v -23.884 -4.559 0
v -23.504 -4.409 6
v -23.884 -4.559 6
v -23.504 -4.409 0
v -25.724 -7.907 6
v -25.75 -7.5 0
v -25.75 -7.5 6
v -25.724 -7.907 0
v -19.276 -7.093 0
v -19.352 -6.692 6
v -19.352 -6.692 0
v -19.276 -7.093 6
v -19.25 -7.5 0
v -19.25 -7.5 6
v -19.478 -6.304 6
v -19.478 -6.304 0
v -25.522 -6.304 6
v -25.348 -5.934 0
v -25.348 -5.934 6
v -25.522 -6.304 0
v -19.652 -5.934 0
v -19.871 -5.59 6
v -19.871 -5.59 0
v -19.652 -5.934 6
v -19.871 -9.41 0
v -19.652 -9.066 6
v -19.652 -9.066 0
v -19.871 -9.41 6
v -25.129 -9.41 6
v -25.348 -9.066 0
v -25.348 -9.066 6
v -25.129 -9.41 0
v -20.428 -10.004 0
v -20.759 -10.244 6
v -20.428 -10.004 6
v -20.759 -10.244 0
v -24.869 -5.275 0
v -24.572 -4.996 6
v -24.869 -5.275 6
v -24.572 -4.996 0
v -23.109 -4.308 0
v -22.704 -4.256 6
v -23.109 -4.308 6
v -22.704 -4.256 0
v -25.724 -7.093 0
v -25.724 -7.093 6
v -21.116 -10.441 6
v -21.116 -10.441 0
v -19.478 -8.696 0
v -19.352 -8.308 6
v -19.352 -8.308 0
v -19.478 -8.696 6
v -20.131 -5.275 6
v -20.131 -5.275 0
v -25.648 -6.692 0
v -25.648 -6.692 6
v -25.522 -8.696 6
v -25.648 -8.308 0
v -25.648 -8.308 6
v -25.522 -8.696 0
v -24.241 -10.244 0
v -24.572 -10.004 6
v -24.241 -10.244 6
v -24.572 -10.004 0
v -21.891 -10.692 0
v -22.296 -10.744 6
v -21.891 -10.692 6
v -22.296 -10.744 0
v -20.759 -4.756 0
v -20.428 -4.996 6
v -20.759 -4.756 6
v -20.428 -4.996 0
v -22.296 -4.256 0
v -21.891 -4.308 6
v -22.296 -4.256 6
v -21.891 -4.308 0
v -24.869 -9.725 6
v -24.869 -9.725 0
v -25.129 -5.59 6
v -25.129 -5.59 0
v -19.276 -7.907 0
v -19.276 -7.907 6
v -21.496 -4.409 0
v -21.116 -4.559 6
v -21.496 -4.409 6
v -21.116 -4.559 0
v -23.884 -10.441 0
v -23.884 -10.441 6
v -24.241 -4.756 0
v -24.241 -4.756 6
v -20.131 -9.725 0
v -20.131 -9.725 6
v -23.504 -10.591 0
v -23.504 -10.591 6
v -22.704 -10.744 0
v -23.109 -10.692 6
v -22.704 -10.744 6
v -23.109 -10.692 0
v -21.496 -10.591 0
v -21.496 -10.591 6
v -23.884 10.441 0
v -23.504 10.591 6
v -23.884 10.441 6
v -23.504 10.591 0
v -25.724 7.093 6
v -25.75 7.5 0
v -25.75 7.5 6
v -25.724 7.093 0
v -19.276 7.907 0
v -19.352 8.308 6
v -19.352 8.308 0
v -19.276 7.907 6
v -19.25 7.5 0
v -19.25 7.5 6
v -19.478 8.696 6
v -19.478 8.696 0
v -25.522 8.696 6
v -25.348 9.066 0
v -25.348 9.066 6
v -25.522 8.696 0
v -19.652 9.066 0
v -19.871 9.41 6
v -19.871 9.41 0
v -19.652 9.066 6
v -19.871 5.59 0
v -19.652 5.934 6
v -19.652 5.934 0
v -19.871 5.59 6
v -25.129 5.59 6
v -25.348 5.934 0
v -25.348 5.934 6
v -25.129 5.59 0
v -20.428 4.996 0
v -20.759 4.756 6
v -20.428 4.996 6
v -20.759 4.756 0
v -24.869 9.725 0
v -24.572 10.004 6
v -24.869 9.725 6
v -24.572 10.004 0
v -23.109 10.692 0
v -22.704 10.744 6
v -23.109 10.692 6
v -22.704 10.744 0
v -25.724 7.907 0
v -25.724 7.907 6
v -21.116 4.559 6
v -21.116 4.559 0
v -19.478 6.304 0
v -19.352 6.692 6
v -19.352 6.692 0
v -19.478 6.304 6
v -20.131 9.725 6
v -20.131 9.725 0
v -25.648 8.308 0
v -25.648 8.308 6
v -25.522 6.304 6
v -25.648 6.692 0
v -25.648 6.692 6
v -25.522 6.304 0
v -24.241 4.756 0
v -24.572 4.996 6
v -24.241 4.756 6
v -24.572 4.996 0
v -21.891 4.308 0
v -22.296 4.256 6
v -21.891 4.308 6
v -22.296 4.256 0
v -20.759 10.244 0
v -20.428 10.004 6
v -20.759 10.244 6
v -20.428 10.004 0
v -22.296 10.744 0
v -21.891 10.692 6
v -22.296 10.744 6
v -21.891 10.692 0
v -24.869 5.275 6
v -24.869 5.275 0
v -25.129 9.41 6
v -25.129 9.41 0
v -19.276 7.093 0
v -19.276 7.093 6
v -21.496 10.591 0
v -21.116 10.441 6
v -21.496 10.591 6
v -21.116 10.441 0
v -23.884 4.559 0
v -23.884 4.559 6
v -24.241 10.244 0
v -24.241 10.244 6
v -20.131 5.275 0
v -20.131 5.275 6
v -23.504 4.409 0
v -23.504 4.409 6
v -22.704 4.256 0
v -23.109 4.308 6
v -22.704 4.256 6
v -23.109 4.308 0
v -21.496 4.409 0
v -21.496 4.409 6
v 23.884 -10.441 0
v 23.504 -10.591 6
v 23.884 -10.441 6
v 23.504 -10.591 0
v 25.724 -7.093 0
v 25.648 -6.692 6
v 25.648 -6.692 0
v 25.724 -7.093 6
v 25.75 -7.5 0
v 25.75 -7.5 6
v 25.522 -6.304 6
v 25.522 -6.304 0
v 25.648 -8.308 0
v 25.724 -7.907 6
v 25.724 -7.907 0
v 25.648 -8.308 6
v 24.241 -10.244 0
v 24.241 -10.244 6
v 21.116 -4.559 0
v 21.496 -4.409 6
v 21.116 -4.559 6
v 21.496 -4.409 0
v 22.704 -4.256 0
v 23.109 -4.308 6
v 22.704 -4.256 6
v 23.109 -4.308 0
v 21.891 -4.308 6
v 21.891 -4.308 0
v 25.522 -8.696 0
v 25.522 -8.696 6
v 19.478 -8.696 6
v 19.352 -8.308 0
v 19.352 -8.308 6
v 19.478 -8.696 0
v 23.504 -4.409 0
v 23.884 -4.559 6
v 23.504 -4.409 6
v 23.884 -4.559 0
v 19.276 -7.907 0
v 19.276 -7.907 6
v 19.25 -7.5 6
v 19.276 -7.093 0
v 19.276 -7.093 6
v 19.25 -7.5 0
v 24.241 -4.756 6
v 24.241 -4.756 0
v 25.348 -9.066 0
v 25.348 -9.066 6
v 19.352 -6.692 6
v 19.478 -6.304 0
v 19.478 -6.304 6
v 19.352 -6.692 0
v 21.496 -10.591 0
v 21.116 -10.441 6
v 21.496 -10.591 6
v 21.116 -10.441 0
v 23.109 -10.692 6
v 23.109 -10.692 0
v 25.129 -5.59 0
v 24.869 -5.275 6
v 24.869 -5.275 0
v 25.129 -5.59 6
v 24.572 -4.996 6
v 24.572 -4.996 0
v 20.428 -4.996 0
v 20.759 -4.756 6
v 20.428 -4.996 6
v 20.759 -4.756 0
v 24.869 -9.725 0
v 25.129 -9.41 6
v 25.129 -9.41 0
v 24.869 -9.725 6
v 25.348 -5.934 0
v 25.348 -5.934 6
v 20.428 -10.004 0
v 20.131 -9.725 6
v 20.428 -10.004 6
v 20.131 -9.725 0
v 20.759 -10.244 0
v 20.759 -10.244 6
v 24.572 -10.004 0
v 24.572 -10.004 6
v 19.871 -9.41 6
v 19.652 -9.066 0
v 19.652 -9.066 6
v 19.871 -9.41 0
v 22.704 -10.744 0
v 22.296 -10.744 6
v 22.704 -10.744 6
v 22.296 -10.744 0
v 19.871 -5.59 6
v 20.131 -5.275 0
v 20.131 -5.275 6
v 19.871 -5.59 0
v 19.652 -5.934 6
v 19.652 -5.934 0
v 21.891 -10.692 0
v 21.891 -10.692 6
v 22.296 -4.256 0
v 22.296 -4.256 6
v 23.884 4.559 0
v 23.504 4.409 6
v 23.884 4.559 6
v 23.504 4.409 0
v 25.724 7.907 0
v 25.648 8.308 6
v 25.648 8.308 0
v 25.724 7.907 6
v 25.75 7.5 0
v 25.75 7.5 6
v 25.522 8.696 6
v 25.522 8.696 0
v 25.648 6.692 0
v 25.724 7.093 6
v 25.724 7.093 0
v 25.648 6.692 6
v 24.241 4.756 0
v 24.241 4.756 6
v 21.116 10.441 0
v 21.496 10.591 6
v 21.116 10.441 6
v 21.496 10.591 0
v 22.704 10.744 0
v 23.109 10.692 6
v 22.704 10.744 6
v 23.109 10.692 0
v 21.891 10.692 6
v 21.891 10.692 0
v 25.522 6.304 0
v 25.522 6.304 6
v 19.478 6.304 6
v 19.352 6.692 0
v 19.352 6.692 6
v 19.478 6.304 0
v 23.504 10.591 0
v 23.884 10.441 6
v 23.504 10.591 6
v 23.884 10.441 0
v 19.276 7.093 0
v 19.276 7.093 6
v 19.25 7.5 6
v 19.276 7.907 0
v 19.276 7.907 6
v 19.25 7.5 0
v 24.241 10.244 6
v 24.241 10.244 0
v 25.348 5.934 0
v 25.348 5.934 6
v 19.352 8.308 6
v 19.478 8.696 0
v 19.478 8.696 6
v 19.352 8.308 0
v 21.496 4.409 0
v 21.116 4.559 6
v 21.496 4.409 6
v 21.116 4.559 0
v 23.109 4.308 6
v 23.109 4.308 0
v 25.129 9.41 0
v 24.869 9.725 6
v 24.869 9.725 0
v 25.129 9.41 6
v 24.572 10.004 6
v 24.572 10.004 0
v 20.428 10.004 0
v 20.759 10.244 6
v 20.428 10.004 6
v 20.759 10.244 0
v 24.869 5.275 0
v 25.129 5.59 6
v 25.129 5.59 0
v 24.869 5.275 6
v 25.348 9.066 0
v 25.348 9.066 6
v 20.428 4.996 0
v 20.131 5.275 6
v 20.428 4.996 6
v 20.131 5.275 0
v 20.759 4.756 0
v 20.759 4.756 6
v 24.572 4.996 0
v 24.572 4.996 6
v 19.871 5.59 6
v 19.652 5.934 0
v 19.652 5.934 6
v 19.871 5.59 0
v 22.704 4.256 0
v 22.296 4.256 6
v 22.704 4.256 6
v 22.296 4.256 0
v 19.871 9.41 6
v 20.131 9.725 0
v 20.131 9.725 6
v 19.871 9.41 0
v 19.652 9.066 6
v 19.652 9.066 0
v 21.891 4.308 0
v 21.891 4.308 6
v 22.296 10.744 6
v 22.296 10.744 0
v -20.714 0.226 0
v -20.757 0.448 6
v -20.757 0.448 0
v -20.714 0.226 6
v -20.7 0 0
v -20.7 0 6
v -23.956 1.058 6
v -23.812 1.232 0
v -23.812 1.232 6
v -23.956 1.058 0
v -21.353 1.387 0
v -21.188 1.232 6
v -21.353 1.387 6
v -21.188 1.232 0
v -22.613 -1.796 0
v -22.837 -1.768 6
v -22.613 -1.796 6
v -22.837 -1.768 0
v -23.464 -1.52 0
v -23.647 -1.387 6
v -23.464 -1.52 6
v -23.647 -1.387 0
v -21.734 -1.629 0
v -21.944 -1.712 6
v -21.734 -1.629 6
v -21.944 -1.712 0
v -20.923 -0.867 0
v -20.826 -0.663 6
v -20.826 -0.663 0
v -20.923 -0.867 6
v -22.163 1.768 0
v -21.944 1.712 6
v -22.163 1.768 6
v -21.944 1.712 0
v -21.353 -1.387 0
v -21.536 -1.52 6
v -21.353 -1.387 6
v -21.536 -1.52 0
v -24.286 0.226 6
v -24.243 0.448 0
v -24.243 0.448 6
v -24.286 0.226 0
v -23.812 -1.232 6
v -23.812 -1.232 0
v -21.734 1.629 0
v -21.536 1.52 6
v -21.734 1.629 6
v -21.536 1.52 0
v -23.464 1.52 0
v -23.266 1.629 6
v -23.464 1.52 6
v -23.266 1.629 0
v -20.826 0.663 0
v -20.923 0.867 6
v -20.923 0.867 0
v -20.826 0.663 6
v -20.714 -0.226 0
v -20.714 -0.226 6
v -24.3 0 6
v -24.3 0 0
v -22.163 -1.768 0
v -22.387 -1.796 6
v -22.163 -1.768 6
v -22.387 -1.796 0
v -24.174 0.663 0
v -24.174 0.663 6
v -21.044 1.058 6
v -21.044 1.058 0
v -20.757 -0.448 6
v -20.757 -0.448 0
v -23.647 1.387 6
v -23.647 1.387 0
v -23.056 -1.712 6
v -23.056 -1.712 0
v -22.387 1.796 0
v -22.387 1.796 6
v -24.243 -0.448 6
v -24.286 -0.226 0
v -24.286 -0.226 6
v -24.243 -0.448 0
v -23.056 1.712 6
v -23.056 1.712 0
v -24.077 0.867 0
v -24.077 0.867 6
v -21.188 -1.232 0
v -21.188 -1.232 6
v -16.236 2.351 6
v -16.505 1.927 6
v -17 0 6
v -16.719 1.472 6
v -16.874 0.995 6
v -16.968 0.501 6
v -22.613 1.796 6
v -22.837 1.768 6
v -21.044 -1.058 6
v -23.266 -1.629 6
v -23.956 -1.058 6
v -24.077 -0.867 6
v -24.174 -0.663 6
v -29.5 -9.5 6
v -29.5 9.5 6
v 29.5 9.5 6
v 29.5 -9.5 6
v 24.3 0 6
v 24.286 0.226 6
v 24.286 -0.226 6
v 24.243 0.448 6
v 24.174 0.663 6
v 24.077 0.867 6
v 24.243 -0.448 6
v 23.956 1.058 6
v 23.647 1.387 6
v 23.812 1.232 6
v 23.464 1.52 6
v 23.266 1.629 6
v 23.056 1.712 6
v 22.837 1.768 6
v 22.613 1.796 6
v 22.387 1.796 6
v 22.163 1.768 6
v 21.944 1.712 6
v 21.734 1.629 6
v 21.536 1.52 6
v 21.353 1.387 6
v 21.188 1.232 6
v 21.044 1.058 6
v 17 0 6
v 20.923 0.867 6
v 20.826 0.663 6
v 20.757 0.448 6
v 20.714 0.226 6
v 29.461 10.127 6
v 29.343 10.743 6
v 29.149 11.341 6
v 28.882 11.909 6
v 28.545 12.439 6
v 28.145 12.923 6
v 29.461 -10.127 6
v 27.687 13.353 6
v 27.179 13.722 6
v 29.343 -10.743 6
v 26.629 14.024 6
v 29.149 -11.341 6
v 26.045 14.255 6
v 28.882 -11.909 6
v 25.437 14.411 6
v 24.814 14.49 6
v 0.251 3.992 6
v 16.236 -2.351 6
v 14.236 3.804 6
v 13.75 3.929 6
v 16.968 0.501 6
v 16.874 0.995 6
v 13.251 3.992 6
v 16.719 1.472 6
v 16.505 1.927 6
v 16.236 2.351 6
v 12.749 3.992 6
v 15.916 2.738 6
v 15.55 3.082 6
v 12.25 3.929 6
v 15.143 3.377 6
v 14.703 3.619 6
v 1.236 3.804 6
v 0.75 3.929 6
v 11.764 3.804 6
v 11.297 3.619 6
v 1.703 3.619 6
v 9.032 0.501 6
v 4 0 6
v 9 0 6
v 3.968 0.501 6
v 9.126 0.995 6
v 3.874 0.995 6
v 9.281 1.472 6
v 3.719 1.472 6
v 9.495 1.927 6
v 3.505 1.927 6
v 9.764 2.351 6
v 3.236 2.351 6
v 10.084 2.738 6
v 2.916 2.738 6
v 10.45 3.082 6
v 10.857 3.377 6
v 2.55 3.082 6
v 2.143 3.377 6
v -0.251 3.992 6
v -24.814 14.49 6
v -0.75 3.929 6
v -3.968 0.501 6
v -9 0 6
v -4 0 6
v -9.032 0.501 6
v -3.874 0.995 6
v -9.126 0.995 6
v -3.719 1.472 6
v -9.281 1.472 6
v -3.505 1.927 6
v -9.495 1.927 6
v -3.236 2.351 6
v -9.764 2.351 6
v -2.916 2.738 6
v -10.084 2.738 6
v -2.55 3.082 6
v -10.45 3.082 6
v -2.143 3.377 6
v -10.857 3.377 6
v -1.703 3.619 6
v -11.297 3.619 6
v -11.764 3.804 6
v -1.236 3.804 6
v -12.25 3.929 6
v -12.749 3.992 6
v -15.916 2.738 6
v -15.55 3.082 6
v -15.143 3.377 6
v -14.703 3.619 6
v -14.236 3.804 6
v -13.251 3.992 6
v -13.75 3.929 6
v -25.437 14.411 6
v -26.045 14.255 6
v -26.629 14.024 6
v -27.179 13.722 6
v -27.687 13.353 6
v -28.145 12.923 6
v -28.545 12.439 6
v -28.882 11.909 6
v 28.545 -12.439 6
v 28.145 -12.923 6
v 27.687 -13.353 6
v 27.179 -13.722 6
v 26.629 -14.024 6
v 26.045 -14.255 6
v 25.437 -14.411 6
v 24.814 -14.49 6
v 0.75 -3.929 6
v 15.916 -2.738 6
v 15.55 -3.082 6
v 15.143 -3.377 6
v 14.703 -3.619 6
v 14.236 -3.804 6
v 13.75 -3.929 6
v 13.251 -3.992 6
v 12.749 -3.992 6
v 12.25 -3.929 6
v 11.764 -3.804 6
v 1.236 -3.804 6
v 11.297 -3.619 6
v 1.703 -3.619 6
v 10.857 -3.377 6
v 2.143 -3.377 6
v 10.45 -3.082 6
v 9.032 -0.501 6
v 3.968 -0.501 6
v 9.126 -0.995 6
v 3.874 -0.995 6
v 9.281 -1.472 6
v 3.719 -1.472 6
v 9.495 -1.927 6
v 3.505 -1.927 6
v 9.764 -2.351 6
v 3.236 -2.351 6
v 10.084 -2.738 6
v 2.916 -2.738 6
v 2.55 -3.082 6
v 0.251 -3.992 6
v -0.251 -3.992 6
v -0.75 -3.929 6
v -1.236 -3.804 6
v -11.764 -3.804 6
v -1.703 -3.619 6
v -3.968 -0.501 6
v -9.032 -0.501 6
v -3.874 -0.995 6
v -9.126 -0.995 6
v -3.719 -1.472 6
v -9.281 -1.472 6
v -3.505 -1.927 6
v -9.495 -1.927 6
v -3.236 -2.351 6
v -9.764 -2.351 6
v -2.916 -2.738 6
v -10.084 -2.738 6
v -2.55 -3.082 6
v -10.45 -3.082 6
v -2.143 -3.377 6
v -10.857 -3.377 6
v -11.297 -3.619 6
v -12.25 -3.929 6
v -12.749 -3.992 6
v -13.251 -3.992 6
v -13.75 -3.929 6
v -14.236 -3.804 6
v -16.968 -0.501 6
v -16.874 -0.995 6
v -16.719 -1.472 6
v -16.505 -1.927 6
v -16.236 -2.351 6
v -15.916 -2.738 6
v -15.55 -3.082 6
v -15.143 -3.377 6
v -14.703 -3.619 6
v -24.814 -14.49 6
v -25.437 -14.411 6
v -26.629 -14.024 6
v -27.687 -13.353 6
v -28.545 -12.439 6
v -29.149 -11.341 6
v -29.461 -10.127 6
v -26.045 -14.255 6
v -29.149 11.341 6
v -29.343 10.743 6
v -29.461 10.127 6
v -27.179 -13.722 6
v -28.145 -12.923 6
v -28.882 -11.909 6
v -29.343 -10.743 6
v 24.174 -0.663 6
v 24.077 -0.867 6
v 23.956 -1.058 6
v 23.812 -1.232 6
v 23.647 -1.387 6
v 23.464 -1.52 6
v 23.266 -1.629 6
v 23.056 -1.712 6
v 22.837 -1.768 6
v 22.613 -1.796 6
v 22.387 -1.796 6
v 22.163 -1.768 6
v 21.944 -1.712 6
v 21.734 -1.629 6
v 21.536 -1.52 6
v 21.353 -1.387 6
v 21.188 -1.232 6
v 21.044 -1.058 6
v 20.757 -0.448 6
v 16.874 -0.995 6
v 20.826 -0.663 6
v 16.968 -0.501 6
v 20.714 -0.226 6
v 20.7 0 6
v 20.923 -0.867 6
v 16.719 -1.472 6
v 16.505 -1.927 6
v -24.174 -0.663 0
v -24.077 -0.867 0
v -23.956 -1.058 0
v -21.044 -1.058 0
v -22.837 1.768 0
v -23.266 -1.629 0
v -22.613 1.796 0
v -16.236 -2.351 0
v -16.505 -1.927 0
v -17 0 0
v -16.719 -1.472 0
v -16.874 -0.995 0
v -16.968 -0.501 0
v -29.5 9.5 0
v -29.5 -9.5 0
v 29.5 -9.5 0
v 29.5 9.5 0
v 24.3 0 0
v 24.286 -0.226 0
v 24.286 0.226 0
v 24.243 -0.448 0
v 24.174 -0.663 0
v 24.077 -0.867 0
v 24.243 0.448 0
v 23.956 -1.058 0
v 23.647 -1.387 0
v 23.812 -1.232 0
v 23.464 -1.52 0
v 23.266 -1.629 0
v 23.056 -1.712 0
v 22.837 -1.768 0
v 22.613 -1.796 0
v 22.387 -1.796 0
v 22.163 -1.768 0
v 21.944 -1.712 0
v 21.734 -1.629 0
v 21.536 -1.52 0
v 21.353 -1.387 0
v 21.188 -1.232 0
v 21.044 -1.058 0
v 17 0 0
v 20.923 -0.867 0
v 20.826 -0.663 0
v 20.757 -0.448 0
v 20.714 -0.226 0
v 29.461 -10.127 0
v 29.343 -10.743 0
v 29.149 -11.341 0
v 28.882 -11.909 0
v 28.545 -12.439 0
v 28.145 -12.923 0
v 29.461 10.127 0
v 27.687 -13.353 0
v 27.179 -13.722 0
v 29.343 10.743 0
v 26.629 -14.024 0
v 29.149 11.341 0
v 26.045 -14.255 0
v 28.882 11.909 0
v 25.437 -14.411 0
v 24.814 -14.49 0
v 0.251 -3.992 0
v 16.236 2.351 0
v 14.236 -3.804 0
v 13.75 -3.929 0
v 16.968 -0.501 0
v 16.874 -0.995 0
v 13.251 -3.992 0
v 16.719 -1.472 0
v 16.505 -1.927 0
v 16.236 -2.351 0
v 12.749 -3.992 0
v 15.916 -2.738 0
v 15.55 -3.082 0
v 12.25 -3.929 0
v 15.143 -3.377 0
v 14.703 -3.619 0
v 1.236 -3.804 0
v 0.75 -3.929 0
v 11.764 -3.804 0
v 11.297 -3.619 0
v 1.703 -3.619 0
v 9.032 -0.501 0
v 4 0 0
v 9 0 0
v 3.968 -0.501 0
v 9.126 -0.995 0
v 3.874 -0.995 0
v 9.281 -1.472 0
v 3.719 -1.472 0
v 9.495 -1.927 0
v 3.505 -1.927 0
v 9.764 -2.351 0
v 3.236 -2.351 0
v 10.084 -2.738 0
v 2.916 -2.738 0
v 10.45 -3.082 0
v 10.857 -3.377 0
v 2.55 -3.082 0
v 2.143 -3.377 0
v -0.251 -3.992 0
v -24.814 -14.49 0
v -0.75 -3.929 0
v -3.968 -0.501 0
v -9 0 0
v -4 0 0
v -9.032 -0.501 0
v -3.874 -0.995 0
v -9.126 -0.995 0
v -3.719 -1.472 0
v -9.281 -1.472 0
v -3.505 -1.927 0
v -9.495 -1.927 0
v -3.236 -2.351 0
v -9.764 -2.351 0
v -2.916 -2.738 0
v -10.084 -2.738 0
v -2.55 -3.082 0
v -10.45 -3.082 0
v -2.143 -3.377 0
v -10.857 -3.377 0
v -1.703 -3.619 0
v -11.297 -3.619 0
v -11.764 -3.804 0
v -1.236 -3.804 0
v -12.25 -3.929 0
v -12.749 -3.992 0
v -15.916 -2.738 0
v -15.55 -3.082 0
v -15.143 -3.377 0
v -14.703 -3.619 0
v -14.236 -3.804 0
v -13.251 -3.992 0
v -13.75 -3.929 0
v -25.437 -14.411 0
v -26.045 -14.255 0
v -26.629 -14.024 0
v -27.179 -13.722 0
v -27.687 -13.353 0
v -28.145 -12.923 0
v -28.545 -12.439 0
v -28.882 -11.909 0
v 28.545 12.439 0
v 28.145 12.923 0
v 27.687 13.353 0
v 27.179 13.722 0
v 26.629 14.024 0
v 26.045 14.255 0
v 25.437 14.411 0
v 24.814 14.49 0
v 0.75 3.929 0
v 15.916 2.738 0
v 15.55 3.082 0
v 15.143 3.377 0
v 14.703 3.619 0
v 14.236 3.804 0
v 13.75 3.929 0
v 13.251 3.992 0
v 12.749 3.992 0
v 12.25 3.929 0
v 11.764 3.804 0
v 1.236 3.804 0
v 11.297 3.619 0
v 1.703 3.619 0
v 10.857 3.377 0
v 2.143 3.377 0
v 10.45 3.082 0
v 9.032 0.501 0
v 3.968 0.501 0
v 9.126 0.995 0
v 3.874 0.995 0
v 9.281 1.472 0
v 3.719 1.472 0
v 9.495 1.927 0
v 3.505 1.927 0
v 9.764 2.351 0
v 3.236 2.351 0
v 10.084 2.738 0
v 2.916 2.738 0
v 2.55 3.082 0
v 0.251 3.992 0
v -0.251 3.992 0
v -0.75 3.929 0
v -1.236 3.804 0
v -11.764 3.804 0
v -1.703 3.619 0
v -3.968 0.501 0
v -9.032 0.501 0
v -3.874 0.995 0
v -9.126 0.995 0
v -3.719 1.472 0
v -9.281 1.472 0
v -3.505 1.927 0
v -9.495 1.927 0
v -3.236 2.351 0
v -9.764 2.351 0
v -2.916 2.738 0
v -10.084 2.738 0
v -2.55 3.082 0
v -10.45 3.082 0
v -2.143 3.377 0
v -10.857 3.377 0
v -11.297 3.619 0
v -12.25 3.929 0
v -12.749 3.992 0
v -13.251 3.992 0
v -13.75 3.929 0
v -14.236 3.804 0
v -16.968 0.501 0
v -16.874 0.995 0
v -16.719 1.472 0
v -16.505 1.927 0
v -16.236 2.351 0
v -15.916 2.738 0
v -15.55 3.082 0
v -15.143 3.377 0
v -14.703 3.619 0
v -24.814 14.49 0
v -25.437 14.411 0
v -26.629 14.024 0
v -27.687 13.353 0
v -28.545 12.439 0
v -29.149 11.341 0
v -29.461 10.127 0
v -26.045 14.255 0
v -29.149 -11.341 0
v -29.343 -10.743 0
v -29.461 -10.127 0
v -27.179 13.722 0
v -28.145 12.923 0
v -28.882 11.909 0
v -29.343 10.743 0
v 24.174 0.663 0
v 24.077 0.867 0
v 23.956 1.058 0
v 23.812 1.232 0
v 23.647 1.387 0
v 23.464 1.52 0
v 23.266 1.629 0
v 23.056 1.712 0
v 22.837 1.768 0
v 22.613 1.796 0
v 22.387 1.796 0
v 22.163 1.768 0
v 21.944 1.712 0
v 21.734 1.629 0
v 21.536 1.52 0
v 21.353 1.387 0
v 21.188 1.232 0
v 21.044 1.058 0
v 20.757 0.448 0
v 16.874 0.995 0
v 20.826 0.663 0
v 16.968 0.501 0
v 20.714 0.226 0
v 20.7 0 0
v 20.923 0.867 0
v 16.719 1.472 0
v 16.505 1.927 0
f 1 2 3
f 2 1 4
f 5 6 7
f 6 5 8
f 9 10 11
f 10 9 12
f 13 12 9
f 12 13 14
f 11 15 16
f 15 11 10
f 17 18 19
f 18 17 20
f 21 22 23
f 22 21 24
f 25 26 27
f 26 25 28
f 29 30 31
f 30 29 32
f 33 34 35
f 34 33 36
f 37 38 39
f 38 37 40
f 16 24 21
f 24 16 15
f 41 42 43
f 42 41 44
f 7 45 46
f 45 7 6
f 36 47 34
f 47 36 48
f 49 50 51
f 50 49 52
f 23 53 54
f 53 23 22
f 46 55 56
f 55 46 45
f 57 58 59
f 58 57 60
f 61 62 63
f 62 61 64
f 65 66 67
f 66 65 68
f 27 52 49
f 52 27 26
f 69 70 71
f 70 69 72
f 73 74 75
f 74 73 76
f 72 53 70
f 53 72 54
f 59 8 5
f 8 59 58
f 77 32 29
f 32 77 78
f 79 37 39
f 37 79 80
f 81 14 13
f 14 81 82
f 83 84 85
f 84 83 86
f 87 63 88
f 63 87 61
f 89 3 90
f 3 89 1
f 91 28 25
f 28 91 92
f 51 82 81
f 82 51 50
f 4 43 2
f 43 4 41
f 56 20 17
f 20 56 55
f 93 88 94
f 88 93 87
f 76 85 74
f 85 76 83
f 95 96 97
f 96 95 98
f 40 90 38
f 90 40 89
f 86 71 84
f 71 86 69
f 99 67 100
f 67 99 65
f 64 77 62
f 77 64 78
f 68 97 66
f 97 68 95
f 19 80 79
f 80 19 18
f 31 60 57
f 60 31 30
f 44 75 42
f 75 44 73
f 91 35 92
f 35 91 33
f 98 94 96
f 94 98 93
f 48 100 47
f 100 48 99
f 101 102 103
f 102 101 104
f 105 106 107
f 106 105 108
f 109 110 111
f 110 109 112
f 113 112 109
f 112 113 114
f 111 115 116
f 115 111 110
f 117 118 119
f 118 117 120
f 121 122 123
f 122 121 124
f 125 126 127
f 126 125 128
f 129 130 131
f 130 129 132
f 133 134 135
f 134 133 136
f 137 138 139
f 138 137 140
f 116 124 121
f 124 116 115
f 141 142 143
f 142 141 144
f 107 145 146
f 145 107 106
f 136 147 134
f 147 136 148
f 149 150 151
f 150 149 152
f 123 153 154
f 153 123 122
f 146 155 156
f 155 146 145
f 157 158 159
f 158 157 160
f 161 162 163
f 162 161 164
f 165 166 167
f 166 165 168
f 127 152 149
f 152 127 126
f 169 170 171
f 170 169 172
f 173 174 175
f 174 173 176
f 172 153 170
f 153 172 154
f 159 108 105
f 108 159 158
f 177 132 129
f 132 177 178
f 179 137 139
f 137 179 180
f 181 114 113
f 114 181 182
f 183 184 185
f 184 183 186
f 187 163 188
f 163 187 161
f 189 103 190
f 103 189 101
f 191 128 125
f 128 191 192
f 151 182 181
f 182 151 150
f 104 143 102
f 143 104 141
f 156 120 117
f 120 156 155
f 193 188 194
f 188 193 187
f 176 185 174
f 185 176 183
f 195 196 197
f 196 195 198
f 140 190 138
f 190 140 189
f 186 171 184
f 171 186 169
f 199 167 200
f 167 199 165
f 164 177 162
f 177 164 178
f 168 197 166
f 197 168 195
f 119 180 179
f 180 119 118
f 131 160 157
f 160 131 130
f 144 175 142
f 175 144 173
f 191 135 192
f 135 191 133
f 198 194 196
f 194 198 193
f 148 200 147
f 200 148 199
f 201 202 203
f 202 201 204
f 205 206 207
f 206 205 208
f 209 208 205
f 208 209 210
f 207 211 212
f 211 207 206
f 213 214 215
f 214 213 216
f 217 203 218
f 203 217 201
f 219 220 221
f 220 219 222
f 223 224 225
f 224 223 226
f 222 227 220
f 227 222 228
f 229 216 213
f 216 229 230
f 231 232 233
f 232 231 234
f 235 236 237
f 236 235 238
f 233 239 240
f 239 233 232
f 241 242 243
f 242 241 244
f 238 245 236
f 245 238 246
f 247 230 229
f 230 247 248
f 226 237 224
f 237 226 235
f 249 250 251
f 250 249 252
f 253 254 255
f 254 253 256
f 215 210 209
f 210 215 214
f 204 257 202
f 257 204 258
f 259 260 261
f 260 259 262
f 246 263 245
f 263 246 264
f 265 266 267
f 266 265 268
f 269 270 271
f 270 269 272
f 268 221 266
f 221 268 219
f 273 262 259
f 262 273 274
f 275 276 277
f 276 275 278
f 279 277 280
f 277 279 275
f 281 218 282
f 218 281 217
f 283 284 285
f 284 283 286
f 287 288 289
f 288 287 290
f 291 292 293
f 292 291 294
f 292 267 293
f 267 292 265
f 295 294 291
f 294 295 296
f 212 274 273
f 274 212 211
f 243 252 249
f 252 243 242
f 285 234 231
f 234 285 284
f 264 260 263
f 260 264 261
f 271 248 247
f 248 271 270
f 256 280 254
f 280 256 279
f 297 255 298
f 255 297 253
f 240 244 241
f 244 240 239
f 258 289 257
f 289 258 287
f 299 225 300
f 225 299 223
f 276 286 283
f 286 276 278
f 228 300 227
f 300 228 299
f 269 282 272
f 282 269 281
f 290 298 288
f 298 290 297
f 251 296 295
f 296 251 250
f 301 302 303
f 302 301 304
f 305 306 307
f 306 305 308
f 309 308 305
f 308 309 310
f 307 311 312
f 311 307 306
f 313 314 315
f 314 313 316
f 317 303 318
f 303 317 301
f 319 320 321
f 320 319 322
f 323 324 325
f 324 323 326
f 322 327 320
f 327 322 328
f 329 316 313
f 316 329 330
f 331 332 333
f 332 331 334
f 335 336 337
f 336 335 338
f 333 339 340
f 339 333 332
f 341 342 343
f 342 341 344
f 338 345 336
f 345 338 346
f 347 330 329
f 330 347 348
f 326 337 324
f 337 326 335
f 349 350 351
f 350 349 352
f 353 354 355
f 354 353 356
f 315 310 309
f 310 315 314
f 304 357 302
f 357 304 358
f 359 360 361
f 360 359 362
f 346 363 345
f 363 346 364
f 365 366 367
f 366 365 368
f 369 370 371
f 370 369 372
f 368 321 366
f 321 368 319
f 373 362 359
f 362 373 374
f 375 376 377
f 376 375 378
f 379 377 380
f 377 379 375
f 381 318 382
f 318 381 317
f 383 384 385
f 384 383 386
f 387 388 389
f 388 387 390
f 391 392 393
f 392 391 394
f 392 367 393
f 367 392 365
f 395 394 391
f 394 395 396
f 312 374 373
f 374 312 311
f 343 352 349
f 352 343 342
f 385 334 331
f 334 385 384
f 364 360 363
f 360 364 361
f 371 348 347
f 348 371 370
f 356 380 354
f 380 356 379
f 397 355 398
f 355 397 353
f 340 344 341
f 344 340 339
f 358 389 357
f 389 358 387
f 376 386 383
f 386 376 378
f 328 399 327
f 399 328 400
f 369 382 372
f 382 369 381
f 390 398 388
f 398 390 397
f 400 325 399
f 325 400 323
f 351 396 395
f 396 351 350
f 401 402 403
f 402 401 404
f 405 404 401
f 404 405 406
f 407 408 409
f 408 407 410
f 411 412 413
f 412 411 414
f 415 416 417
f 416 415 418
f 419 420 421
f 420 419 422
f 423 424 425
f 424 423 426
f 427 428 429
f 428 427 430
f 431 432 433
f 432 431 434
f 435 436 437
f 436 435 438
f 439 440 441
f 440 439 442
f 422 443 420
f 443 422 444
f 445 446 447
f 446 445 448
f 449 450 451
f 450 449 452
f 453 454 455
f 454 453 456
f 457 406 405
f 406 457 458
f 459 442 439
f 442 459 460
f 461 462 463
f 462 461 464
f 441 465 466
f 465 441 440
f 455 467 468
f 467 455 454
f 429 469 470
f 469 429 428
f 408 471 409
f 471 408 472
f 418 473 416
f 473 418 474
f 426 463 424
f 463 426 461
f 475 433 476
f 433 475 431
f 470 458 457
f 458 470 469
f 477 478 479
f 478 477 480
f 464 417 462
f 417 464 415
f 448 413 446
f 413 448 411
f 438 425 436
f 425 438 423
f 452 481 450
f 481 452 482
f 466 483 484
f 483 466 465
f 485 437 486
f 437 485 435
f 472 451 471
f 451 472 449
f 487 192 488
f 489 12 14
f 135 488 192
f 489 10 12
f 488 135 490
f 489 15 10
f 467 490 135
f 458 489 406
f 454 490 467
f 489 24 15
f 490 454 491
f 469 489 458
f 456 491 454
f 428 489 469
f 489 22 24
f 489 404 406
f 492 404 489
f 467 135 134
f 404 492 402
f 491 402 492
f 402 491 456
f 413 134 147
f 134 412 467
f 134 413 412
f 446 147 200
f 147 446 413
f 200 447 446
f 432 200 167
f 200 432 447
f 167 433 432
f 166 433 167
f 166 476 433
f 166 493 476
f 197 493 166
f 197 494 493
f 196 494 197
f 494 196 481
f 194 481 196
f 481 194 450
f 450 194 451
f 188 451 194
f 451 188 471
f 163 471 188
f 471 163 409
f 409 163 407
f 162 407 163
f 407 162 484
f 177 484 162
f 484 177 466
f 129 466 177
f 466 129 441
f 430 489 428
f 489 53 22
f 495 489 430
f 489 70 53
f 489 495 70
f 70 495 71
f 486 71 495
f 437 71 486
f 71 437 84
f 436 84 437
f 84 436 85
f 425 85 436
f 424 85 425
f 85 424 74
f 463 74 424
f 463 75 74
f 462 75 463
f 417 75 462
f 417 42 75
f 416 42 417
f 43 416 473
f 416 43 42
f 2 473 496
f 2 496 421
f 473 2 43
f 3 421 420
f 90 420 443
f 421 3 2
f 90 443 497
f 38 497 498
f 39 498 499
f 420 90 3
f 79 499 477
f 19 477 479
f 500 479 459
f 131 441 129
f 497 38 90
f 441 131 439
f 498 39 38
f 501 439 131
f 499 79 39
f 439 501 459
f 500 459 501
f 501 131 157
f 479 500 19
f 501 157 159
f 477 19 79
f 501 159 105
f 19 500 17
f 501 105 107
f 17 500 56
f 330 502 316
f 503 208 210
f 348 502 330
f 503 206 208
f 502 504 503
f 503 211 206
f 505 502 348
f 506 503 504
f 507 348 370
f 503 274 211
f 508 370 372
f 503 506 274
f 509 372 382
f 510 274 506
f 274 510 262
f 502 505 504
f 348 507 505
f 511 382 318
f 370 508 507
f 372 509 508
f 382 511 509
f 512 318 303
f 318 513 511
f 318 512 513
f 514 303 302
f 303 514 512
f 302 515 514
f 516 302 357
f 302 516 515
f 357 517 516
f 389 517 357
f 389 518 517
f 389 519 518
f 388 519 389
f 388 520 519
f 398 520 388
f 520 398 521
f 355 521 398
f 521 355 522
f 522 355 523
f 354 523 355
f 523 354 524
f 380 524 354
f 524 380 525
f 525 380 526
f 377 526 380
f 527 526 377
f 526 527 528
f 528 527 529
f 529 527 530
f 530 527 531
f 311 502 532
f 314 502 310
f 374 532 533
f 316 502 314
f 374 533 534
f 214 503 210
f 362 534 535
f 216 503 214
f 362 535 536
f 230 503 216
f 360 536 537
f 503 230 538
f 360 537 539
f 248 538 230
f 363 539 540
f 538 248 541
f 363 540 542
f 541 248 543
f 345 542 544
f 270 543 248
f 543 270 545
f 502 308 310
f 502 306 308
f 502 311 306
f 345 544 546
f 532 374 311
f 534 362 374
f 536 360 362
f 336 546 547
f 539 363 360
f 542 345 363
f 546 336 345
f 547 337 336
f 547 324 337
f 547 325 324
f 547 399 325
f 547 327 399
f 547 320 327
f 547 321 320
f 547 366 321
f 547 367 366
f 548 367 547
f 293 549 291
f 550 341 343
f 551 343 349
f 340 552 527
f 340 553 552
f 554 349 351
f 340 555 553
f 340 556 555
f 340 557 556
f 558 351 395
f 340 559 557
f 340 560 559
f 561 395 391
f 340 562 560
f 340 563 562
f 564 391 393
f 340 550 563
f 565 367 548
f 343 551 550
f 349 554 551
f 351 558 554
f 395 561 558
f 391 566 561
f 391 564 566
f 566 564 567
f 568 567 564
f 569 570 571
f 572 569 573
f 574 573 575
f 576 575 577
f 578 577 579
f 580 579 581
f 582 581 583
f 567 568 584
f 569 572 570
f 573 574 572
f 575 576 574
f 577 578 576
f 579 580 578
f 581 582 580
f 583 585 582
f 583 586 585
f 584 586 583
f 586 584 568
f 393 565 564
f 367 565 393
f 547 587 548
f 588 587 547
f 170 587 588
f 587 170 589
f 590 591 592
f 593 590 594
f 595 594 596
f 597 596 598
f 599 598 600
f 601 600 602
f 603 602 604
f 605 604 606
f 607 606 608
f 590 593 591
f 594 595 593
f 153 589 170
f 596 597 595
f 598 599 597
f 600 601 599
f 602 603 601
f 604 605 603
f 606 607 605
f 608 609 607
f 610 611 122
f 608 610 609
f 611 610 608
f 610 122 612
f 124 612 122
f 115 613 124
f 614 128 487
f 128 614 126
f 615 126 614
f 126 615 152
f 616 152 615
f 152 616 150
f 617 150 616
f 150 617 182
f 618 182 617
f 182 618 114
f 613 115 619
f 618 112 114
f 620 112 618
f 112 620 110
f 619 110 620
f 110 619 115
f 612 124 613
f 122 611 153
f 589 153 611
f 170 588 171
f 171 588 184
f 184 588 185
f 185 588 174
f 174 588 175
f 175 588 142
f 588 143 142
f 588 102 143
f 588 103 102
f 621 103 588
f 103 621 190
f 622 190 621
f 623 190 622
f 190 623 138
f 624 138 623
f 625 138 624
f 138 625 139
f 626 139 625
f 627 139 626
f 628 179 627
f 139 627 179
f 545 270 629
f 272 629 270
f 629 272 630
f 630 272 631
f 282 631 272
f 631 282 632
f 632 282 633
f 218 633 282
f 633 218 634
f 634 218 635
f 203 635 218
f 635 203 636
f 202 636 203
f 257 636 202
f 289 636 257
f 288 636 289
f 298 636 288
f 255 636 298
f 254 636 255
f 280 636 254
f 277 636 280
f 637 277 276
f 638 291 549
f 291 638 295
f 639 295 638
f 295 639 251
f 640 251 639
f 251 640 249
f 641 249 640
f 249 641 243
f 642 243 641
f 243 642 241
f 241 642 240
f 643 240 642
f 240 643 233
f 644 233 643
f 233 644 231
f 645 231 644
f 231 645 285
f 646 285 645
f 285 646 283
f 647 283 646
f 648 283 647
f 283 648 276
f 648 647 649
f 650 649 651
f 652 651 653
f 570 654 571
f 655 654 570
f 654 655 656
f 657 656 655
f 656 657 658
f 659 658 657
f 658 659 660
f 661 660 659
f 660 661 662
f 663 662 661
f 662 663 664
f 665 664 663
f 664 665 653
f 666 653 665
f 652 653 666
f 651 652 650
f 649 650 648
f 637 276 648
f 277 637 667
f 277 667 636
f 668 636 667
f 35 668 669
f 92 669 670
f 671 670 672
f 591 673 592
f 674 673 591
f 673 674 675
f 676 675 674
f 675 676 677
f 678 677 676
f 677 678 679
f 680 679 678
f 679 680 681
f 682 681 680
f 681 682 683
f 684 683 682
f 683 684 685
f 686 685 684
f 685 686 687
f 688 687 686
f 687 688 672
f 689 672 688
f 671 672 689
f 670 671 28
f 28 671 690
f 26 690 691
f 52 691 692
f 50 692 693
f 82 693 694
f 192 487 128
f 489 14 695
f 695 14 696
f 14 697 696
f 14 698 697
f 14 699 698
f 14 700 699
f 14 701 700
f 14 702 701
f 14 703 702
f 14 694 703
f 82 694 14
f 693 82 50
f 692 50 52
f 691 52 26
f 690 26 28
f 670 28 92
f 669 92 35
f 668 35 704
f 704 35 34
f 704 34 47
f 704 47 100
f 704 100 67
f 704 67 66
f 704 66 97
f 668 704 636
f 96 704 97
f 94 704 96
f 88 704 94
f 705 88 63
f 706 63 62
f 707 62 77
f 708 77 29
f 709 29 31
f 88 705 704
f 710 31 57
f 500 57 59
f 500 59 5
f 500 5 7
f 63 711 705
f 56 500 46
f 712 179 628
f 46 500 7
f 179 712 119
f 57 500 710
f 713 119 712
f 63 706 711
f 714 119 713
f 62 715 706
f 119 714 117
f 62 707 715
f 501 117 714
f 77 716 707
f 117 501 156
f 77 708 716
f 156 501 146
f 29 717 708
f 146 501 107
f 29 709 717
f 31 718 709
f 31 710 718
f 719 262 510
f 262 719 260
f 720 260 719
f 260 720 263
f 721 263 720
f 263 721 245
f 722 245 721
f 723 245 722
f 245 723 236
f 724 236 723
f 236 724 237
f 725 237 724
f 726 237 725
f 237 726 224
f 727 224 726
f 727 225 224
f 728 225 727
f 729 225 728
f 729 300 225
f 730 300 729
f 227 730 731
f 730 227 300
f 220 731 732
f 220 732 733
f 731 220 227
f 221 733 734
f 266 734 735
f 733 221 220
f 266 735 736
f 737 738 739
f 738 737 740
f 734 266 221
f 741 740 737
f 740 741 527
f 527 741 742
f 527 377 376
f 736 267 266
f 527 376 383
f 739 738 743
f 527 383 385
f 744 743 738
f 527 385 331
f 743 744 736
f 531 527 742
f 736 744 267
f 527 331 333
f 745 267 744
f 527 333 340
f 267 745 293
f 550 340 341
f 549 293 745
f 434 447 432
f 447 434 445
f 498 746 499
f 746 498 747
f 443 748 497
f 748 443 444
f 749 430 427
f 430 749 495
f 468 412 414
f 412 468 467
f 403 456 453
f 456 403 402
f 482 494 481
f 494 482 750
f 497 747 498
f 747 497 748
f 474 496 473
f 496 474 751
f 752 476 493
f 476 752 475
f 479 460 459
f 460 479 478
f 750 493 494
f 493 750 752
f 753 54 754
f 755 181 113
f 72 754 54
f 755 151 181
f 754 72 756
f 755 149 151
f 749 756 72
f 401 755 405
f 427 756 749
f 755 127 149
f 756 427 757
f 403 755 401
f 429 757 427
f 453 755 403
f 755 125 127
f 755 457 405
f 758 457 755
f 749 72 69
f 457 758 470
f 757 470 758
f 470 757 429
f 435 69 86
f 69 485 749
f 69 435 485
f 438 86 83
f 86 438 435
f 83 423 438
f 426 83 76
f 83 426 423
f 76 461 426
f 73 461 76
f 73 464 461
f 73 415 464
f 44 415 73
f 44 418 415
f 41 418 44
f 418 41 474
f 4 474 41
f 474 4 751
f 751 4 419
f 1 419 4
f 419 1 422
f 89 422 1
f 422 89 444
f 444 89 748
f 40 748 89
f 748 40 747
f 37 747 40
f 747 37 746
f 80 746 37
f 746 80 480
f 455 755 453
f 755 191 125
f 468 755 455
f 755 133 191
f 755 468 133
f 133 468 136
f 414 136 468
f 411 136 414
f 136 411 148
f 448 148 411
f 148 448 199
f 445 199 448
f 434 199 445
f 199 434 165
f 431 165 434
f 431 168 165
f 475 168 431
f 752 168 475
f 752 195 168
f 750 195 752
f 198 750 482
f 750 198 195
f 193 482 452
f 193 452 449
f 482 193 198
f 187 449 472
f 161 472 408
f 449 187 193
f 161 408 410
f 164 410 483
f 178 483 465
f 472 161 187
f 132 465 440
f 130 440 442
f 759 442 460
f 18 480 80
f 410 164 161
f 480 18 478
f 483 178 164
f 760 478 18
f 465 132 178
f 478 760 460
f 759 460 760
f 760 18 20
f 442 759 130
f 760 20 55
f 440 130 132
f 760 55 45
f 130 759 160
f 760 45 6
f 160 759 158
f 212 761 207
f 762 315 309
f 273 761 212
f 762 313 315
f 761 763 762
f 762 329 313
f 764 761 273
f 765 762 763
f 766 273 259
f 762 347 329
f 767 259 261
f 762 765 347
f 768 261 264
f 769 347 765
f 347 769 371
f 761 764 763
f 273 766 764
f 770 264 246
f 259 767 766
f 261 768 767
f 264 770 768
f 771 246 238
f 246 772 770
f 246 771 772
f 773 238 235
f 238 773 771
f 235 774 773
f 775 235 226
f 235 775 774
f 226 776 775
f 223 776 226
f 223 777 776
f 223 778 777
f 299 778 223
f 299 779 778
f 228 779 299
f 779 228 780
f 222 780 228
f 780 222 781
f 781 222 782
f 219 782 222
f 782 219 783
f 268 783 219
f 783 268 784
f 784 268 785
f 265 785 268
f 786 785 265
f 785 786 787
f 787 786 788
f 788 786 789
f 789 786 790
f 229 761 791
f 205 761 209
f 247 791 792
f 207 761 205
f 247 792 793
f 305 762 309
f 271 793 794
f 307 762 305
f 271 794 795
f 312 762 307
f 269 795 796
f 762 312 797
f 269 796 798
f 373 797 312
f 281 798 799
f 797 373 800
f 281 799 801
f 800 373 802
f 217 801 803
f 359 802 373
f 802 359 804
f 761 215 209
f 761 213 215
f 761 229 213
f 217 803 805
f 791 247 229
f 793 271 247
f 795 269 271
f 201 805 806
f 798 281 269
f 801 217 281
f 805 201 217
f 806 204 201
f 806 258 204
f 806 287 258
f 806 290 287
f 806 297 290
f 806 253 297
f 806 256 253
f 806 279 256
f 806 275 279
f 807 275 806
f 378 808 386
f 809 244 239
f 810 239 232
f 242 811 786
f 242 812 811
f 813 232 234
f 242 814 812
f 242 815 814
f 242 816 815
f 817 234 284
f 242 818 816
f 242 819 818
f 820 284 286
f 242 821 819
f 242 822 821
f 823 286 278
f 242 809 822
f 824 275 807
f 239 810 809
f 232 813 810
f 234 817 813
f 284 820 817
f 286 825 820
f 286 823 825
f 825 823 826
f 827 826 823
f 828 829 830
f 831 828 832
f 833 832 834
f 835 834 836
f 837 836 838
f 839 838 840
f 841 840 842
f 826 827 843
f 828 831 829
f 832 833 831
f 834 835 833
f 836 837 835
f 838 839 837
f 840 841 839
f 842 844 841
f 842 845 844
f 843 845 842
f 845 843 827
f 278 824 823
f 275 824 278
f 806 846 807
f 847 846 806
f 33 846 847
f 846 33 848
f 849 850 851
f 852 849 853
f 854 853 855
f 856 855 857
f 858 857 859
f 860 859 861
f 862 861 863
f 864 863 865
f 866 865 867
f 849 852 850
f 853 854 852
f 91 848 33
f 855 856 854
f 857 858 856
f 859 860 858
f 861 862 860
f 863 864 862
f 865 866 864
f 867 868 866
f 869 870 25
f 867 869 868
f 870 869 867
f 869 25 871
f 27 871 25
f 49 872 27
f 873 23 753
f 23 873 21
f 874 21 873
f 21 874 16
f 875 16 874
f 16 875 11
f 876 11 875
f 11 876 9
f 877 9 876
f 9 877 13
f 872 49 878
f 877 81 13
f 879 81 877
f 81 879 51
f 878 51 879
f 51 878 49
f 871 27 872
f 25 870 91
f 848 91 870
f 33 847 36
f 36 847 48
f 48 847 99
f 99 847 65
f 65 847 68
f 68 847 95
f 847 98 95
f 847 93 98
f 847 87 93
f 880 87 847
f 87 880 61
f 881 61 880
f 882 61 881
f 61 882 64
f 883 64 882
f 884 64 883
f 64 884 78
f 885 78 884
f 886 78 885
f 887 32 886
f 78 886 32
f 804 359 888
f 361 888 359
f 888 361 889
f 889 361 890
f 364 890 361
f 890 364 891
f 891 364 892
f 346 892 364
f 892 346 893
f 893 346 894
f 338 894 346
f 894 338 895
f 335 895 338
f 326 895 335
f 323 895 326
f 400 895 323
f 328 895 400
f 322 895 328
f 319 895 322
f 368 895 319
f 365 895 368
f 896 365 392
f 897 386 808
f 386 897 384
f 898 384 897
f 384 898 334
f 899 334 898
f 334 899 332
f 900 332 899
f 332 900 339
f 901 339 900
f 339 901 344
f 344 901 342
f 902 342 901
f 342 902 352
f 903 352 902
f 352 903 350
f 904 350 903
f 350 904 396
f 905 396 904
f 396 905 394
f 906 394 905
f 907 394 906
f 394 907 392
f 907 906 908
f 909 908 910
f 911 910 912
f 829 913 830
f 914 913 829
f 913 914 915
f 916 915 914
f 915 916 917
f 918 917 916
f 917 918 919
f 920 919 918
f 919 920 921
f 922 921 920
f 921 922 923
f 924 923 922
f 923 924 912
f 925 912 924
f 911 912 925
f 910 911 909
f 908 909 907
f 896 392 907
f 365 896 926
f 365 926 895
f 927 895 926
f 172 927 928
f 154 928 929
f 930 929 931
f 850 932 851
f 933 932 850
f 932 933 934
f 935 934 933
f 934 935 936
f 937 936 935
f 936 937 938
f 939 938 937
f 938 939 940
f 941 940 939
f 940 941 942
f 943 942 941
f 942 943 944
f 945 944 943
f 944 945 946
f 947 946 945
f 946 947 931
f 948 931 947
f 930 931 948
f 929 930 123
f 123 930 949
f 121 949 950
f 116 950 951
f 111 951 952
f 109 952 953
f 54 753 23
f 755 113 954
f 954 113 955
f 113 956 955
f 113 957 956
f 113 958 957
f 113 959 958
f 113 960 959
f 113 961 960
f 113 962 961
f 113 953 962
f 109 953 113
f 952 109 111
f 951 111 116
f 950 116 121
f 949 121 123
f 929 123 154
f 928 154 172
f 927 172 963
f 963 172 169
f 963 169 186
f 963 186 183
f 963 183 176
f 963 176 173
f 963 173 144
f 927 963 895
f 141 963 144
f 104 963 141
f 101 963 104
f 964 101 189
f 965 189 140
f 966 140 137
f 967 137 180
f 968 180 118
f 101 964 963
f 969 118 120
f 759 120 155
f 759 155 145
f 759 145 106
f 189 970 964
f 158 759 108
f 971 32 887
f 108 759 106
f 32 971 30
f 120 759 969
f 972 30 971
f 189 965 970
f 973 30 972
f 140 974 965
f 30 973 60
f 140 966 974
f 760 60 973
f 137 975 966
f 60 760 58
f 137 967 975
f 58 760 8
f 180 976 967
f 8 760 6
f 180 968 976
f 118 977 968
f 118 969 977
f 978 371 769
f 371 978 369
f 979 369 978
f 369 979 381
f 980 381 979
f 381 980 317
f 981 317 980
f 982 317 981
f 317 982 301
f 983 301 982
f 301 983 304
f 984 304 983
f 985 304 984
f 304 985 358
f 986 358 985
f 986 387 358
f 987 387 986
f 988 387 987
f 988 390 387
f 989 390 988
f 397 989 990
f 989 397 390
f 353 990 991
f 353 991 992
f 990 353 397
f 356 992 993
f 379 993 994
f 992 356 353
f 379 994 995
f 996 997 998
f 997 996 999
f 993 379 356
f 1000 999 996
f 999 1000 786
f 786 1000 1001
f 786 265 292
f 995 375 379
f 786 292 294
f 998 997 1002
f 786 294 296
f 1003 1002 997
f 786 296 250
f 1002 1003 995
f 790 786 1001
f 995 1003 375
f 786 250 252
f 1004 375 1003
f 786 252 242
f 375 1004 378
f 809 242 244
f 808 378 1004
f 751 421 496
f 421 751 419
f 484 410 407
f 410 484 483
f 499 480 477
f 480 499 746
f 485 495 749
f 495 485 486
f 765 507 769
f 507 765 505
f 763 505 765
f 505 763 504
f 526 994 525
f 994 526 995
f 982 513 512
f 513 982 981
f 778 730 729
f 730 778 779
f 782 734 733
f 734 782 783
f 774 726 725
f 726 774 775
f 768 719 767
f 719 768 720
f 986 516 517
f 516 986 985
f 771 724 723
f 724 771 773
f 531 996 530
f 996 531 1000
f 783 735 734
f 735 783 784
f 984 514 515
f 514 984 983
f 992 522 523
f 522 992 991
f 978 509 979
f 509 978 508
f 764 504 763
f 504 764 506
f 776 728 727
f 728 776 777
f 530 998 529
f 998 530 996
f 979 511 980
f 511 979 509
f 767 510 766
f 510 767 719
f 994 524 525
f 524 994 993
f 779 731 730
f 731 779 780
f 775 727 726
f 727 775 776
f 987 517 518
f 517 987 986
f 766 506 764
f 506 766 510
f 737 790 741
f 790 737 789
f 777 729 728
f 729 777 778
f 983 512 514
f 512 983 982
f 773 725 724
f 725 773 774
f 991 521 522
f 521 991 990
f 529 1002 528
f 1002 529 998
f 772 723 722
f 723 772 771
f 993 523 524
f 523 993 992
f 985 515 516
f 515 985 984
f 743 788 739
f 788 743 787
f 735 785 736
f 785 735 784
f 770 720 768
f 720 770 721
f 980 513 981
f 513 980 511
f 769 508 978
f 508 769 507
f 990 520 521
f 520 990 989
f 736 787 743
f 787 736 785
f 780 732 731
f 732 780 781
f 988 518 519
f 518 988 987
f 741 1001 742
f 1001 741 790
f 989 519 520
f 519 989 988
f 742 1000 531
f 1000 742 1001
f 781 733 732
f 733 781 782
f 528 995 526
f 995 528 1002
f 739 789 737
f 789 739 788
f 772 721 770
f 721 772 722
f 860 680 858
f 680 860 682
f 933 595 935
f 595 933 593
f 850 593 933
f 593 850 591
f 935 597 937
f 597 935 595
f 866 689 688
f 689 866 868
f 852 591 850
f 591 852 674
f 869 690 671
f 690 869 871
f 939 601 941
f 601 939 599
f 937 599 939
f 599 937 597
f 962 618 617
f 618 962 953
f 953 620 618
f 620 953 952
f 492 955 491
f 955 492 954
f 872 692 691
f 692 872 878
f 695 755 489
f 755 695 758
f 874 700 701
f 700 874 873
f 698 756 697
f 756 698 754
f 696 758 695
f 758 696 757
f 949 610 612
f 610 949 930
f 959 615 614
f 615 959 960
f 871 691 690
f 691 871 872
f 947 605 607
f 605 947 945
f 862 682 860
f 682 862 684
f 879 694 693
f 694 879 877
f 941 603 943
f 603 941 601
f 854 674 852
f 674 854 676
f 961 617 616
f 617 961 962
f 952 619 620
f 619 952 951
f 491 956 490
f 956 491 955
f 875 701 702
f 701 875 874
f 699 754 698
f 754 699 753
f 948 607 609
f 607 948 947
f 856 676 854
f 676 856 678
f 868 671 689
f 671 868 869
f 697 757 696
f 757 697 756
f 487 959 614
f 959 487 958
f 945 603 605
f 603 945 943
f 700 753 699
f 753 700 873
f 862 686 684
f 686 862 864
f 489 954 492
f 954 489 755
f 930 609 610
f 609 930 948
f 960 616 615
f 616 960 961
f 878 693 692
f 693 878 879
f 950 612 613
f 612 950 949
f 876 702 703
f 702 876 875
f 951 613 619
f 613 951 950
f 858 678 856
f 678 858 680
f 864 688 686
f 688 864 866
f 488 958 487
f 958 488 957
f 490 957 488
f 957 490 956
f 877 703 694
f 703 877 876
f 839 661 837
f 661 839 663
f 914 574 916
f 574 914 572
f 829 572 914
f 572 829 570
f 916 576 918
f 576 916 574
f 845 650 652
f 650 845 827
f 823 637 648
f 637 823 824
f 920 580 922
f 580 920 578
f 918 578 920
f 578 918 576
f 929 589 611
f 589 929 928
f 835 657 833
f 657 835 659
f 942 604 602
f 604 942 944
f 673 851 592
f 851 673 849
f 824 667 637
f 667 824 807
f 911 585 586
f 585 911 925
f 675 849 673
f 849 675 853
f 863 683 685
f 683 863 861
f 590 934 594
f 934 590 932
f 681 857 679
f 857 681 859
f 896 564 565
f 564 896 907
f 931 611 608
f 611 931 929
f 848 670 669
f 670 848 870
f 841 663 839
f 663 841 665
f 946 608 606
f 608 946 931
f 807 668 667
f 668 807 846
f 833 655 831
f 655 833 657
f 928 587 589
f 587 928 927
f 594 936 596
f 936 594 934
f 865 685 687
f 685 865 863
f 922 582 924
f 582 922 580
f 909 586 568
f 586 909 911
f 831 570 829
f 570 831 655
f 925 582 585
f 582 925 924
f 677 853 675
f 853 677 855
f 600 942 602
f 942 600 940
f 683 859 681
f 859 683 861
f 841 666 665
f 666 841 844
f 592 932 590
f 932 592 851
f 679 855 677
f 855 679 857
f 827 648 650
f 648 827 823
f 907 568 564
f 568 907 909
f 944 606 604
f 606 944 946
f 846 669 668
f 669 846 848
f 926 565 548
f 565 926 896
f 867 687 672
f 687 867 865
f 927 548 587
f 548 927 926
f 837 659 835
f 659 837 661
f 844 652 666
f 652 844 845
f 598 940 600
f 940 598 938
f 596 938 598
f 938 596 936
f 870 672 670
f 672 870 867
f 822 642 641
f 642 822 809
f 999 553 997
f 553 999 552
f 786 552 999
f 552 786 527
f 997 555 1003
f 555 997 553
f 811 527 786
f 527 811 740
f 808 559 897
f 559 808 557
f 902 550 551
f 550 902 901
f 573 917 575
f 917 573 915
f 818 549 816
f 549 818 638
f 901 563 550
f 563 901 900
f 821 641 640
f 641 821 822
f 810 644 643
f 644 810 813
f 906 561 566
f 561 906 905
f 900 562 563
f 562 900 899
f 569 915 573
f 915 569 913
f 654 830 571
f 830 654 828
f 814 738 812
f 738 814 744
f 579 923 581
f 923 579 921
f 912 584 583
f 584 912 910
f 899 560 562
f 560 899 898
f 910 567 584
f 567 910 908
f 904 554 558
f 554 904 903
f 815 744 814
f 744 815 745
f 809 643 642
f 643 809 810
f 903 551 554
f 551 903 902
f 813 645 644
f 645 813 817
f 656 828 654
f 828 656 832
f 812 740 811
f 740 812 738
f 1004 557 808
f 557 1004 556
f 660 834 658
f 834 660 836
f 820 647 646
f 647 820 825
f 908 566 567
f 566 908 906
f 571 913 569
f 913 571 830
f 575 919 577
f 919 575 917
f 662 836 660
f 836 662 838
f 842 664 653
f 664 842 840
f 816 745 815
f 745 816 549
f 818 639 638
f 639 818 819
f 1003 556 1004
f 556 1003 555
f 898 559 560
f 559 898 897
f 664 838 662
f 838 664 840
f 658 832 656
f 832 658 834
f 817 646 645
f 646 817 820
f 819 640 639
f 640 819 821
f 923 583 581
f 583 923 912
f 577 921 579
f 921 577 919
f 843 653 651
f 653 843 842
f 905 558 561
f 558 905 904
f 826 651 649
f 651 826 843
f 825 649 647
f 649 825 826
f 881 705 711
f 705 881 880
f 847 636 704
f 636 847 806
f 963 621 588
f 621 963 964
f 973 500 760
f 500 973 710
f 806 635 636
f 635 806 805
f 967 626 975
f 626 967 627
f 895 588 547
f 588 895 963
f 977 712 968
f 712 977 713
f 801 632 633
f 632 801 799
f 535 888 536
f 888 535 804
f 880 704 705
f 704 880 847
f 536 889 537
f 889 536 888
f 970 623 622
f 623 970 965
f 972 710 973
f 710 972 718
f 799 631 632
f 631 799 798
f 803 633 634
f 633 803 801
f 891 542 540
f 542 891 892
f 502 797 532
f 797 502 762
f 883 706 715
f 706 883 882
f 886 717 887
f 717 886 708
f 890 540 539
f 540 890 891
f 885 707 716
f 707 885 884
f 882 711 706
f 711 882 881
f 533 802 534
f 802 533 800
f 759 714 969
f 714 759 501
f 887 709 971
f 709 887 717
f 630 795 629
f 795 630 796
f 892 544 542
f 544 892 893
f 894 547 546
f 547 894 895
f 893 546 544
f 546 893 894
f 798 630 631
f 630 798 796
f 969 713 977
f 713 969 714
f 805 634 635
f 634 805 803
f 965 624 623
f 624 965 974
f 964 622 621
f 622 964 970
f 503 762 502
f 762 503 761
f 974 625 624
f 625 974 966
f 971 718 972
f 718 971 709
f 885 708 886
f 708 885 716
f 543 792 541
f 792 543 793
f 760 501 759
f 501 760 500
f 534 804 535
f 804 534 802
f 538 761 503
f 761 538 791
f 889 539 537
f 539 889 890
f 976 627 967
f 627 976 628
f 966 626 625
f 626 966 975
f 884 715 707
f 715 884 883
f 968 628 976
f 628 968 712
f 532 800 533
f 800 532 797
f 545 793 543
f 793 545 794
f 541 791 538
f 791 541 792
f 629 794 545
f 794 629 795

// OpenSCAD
$fn = 50;


difference() {
	union() {
		hull() {
			translate(v = [-24.5000000000, 9.5000000000, 0]) {
				cylinder(h = 6, r = 5);
			}
			translate(v = [24.5000000000, 9.5000000000, 0]) {
				cylinder(h = 6, r = 5);
			}
			translate(v = [-24.5000000000, -9.5000000000, 0]) {
				cylinder(h = 6, r = 5);
			}
			translate(v = [24.5000000000, -9.5000000000, 0]) {
				cylinder(h = 6, r = 5);
			}
		}
	}
	union() {
		#translate(v = [-22.5000000000, -7.5000000000, 0]) {
			cylinder(h = 6, r = 3.2500000000);
		}
		#translate(v = [-22.5000000000, 7.5000000000, 0]) {
			cylinder(h = 6, r = 3.2500000000);
		}
		#translate(v = [22.5000000000, -7.5000000000, 0]) {
			cylinder(h = 6, r = 3.2500000000);
		}
		#translate(v = [22.5000000000, 7.5000000000, 0]) {
			cylinder(h = 6, r = 3.2500000000);
		}
		#translate(v = [-22.5000000000, -7.5000000000, -100.0000000000]) {
			cylinder(h = 200, r = 3.2500000000);
		}
		#translate(v = [-22.5000000000, 7.5000000000, -100.0000000000]) {
			cylinder(h = 200, r = 3.2500000000);
		}
		#translate(v = [22.5000000000, -7.5000000000, -100.0000000000]) {
			cylinder(h = 200, r = 3.2500000000);
		}
		#translate(v = [22.5000000000, 7.5000000000, -100.0000000000]) {
			cylinder(h = 200, r = 3.2500000000);
		}
		#translate(v = [-22.5000000000, -7.5000000000, 0]) {
			cylinder(h = 6, r = 1.8000000000);
		}
		#translate(v = [-22.5000000000, 0.0000000000, 0]) {
			cylinder(h = 6, r = 1.8000000000);
		}
		#translate(v = [-22.5000000000, 7.5000000000, 0]) {
			cylinder(h = 6, r = 1.8000000000);
		}
		#translate(v = [22.5000000000, -7.5000000000, 0]) {
			cylinder(h = 6, r = 1.8000000000);
		}
		#translate(v = [22.5000000000, 0.0000000000, 0]) {
			cylinder(h = 6, r = 1.8000000000);
		}
		#translate(v = [22.5000000000, 7.5000000000, 0]) {
			cylinder(h = 6, r = 1.8000000000);
		}
		#translate(v = [-22.5000000000, -7.5000000000, 0]) {
			cylinder(h = 6, r = 1.8000000000);
		}
		#translate(v = [-22.5000000000, 0.0000000000, 0]) {
			cylinder(h = 6, r = 1.8000000000);
		}
		#translate(v = [-22.5000000000, 7.5000000000, 0]) {
			cylinder(h = 6, r = 1.8000000000);
		}
		#translate(v = [22.5000000000, -7.5000000000, 0]) {
			cylinder(h = 6, r = 1.8000000000);
		}
		#translate(v = [22.5000000000, 0.0000000000, 0]) {
			cylinder(h = 6, r = 1.8000000000);
		}
		#translate(v = [22.5000000000, 7.5000000000, 0]) {
			cylinder(h = 6, r = 1.8000000000);
		}
		#translate(v = [-22.5000000000, -7.5000000000, 0]) {
			cylinder(h = 6, r = 1.8000000000);
		}
		#translate(v = [-22.5000000000, 0.0000000000, 0]) {
			cylinder(h = 6, r = 1.8000000000);
		}
		#translate(v = [-22.5000000000, 7.5000000000, 0]) {
			cylinder(h = 6, r = 1.8000000000);
		}
		#translate(v = [22.5000000000, -7.5000000000, 0]) {
			cylinder(h = 6, r = 1.8000000000);
		}
		#translate(v = [22.5000000000, 0.0000000000, 0]) {
			cylinder(h = 6, r = 1.8000000000);
		}
		#translate(v = [22.5000000000, 7.5000000000, 0]) {
			cylinder(h = 6, r = 1.8000000000);
		}
		#translate(v = [-13.0000000000, 0, 0]) {
			cylinder(h = 6, r = 4.0000000000);
		}
		#cylinder(h = 6, r = 4.0000000000);
		#translate(v = [13.0000000000, 0, 0]) {
			cylinder(h = 6, r = 4.0000000000);
		}
	}
}
